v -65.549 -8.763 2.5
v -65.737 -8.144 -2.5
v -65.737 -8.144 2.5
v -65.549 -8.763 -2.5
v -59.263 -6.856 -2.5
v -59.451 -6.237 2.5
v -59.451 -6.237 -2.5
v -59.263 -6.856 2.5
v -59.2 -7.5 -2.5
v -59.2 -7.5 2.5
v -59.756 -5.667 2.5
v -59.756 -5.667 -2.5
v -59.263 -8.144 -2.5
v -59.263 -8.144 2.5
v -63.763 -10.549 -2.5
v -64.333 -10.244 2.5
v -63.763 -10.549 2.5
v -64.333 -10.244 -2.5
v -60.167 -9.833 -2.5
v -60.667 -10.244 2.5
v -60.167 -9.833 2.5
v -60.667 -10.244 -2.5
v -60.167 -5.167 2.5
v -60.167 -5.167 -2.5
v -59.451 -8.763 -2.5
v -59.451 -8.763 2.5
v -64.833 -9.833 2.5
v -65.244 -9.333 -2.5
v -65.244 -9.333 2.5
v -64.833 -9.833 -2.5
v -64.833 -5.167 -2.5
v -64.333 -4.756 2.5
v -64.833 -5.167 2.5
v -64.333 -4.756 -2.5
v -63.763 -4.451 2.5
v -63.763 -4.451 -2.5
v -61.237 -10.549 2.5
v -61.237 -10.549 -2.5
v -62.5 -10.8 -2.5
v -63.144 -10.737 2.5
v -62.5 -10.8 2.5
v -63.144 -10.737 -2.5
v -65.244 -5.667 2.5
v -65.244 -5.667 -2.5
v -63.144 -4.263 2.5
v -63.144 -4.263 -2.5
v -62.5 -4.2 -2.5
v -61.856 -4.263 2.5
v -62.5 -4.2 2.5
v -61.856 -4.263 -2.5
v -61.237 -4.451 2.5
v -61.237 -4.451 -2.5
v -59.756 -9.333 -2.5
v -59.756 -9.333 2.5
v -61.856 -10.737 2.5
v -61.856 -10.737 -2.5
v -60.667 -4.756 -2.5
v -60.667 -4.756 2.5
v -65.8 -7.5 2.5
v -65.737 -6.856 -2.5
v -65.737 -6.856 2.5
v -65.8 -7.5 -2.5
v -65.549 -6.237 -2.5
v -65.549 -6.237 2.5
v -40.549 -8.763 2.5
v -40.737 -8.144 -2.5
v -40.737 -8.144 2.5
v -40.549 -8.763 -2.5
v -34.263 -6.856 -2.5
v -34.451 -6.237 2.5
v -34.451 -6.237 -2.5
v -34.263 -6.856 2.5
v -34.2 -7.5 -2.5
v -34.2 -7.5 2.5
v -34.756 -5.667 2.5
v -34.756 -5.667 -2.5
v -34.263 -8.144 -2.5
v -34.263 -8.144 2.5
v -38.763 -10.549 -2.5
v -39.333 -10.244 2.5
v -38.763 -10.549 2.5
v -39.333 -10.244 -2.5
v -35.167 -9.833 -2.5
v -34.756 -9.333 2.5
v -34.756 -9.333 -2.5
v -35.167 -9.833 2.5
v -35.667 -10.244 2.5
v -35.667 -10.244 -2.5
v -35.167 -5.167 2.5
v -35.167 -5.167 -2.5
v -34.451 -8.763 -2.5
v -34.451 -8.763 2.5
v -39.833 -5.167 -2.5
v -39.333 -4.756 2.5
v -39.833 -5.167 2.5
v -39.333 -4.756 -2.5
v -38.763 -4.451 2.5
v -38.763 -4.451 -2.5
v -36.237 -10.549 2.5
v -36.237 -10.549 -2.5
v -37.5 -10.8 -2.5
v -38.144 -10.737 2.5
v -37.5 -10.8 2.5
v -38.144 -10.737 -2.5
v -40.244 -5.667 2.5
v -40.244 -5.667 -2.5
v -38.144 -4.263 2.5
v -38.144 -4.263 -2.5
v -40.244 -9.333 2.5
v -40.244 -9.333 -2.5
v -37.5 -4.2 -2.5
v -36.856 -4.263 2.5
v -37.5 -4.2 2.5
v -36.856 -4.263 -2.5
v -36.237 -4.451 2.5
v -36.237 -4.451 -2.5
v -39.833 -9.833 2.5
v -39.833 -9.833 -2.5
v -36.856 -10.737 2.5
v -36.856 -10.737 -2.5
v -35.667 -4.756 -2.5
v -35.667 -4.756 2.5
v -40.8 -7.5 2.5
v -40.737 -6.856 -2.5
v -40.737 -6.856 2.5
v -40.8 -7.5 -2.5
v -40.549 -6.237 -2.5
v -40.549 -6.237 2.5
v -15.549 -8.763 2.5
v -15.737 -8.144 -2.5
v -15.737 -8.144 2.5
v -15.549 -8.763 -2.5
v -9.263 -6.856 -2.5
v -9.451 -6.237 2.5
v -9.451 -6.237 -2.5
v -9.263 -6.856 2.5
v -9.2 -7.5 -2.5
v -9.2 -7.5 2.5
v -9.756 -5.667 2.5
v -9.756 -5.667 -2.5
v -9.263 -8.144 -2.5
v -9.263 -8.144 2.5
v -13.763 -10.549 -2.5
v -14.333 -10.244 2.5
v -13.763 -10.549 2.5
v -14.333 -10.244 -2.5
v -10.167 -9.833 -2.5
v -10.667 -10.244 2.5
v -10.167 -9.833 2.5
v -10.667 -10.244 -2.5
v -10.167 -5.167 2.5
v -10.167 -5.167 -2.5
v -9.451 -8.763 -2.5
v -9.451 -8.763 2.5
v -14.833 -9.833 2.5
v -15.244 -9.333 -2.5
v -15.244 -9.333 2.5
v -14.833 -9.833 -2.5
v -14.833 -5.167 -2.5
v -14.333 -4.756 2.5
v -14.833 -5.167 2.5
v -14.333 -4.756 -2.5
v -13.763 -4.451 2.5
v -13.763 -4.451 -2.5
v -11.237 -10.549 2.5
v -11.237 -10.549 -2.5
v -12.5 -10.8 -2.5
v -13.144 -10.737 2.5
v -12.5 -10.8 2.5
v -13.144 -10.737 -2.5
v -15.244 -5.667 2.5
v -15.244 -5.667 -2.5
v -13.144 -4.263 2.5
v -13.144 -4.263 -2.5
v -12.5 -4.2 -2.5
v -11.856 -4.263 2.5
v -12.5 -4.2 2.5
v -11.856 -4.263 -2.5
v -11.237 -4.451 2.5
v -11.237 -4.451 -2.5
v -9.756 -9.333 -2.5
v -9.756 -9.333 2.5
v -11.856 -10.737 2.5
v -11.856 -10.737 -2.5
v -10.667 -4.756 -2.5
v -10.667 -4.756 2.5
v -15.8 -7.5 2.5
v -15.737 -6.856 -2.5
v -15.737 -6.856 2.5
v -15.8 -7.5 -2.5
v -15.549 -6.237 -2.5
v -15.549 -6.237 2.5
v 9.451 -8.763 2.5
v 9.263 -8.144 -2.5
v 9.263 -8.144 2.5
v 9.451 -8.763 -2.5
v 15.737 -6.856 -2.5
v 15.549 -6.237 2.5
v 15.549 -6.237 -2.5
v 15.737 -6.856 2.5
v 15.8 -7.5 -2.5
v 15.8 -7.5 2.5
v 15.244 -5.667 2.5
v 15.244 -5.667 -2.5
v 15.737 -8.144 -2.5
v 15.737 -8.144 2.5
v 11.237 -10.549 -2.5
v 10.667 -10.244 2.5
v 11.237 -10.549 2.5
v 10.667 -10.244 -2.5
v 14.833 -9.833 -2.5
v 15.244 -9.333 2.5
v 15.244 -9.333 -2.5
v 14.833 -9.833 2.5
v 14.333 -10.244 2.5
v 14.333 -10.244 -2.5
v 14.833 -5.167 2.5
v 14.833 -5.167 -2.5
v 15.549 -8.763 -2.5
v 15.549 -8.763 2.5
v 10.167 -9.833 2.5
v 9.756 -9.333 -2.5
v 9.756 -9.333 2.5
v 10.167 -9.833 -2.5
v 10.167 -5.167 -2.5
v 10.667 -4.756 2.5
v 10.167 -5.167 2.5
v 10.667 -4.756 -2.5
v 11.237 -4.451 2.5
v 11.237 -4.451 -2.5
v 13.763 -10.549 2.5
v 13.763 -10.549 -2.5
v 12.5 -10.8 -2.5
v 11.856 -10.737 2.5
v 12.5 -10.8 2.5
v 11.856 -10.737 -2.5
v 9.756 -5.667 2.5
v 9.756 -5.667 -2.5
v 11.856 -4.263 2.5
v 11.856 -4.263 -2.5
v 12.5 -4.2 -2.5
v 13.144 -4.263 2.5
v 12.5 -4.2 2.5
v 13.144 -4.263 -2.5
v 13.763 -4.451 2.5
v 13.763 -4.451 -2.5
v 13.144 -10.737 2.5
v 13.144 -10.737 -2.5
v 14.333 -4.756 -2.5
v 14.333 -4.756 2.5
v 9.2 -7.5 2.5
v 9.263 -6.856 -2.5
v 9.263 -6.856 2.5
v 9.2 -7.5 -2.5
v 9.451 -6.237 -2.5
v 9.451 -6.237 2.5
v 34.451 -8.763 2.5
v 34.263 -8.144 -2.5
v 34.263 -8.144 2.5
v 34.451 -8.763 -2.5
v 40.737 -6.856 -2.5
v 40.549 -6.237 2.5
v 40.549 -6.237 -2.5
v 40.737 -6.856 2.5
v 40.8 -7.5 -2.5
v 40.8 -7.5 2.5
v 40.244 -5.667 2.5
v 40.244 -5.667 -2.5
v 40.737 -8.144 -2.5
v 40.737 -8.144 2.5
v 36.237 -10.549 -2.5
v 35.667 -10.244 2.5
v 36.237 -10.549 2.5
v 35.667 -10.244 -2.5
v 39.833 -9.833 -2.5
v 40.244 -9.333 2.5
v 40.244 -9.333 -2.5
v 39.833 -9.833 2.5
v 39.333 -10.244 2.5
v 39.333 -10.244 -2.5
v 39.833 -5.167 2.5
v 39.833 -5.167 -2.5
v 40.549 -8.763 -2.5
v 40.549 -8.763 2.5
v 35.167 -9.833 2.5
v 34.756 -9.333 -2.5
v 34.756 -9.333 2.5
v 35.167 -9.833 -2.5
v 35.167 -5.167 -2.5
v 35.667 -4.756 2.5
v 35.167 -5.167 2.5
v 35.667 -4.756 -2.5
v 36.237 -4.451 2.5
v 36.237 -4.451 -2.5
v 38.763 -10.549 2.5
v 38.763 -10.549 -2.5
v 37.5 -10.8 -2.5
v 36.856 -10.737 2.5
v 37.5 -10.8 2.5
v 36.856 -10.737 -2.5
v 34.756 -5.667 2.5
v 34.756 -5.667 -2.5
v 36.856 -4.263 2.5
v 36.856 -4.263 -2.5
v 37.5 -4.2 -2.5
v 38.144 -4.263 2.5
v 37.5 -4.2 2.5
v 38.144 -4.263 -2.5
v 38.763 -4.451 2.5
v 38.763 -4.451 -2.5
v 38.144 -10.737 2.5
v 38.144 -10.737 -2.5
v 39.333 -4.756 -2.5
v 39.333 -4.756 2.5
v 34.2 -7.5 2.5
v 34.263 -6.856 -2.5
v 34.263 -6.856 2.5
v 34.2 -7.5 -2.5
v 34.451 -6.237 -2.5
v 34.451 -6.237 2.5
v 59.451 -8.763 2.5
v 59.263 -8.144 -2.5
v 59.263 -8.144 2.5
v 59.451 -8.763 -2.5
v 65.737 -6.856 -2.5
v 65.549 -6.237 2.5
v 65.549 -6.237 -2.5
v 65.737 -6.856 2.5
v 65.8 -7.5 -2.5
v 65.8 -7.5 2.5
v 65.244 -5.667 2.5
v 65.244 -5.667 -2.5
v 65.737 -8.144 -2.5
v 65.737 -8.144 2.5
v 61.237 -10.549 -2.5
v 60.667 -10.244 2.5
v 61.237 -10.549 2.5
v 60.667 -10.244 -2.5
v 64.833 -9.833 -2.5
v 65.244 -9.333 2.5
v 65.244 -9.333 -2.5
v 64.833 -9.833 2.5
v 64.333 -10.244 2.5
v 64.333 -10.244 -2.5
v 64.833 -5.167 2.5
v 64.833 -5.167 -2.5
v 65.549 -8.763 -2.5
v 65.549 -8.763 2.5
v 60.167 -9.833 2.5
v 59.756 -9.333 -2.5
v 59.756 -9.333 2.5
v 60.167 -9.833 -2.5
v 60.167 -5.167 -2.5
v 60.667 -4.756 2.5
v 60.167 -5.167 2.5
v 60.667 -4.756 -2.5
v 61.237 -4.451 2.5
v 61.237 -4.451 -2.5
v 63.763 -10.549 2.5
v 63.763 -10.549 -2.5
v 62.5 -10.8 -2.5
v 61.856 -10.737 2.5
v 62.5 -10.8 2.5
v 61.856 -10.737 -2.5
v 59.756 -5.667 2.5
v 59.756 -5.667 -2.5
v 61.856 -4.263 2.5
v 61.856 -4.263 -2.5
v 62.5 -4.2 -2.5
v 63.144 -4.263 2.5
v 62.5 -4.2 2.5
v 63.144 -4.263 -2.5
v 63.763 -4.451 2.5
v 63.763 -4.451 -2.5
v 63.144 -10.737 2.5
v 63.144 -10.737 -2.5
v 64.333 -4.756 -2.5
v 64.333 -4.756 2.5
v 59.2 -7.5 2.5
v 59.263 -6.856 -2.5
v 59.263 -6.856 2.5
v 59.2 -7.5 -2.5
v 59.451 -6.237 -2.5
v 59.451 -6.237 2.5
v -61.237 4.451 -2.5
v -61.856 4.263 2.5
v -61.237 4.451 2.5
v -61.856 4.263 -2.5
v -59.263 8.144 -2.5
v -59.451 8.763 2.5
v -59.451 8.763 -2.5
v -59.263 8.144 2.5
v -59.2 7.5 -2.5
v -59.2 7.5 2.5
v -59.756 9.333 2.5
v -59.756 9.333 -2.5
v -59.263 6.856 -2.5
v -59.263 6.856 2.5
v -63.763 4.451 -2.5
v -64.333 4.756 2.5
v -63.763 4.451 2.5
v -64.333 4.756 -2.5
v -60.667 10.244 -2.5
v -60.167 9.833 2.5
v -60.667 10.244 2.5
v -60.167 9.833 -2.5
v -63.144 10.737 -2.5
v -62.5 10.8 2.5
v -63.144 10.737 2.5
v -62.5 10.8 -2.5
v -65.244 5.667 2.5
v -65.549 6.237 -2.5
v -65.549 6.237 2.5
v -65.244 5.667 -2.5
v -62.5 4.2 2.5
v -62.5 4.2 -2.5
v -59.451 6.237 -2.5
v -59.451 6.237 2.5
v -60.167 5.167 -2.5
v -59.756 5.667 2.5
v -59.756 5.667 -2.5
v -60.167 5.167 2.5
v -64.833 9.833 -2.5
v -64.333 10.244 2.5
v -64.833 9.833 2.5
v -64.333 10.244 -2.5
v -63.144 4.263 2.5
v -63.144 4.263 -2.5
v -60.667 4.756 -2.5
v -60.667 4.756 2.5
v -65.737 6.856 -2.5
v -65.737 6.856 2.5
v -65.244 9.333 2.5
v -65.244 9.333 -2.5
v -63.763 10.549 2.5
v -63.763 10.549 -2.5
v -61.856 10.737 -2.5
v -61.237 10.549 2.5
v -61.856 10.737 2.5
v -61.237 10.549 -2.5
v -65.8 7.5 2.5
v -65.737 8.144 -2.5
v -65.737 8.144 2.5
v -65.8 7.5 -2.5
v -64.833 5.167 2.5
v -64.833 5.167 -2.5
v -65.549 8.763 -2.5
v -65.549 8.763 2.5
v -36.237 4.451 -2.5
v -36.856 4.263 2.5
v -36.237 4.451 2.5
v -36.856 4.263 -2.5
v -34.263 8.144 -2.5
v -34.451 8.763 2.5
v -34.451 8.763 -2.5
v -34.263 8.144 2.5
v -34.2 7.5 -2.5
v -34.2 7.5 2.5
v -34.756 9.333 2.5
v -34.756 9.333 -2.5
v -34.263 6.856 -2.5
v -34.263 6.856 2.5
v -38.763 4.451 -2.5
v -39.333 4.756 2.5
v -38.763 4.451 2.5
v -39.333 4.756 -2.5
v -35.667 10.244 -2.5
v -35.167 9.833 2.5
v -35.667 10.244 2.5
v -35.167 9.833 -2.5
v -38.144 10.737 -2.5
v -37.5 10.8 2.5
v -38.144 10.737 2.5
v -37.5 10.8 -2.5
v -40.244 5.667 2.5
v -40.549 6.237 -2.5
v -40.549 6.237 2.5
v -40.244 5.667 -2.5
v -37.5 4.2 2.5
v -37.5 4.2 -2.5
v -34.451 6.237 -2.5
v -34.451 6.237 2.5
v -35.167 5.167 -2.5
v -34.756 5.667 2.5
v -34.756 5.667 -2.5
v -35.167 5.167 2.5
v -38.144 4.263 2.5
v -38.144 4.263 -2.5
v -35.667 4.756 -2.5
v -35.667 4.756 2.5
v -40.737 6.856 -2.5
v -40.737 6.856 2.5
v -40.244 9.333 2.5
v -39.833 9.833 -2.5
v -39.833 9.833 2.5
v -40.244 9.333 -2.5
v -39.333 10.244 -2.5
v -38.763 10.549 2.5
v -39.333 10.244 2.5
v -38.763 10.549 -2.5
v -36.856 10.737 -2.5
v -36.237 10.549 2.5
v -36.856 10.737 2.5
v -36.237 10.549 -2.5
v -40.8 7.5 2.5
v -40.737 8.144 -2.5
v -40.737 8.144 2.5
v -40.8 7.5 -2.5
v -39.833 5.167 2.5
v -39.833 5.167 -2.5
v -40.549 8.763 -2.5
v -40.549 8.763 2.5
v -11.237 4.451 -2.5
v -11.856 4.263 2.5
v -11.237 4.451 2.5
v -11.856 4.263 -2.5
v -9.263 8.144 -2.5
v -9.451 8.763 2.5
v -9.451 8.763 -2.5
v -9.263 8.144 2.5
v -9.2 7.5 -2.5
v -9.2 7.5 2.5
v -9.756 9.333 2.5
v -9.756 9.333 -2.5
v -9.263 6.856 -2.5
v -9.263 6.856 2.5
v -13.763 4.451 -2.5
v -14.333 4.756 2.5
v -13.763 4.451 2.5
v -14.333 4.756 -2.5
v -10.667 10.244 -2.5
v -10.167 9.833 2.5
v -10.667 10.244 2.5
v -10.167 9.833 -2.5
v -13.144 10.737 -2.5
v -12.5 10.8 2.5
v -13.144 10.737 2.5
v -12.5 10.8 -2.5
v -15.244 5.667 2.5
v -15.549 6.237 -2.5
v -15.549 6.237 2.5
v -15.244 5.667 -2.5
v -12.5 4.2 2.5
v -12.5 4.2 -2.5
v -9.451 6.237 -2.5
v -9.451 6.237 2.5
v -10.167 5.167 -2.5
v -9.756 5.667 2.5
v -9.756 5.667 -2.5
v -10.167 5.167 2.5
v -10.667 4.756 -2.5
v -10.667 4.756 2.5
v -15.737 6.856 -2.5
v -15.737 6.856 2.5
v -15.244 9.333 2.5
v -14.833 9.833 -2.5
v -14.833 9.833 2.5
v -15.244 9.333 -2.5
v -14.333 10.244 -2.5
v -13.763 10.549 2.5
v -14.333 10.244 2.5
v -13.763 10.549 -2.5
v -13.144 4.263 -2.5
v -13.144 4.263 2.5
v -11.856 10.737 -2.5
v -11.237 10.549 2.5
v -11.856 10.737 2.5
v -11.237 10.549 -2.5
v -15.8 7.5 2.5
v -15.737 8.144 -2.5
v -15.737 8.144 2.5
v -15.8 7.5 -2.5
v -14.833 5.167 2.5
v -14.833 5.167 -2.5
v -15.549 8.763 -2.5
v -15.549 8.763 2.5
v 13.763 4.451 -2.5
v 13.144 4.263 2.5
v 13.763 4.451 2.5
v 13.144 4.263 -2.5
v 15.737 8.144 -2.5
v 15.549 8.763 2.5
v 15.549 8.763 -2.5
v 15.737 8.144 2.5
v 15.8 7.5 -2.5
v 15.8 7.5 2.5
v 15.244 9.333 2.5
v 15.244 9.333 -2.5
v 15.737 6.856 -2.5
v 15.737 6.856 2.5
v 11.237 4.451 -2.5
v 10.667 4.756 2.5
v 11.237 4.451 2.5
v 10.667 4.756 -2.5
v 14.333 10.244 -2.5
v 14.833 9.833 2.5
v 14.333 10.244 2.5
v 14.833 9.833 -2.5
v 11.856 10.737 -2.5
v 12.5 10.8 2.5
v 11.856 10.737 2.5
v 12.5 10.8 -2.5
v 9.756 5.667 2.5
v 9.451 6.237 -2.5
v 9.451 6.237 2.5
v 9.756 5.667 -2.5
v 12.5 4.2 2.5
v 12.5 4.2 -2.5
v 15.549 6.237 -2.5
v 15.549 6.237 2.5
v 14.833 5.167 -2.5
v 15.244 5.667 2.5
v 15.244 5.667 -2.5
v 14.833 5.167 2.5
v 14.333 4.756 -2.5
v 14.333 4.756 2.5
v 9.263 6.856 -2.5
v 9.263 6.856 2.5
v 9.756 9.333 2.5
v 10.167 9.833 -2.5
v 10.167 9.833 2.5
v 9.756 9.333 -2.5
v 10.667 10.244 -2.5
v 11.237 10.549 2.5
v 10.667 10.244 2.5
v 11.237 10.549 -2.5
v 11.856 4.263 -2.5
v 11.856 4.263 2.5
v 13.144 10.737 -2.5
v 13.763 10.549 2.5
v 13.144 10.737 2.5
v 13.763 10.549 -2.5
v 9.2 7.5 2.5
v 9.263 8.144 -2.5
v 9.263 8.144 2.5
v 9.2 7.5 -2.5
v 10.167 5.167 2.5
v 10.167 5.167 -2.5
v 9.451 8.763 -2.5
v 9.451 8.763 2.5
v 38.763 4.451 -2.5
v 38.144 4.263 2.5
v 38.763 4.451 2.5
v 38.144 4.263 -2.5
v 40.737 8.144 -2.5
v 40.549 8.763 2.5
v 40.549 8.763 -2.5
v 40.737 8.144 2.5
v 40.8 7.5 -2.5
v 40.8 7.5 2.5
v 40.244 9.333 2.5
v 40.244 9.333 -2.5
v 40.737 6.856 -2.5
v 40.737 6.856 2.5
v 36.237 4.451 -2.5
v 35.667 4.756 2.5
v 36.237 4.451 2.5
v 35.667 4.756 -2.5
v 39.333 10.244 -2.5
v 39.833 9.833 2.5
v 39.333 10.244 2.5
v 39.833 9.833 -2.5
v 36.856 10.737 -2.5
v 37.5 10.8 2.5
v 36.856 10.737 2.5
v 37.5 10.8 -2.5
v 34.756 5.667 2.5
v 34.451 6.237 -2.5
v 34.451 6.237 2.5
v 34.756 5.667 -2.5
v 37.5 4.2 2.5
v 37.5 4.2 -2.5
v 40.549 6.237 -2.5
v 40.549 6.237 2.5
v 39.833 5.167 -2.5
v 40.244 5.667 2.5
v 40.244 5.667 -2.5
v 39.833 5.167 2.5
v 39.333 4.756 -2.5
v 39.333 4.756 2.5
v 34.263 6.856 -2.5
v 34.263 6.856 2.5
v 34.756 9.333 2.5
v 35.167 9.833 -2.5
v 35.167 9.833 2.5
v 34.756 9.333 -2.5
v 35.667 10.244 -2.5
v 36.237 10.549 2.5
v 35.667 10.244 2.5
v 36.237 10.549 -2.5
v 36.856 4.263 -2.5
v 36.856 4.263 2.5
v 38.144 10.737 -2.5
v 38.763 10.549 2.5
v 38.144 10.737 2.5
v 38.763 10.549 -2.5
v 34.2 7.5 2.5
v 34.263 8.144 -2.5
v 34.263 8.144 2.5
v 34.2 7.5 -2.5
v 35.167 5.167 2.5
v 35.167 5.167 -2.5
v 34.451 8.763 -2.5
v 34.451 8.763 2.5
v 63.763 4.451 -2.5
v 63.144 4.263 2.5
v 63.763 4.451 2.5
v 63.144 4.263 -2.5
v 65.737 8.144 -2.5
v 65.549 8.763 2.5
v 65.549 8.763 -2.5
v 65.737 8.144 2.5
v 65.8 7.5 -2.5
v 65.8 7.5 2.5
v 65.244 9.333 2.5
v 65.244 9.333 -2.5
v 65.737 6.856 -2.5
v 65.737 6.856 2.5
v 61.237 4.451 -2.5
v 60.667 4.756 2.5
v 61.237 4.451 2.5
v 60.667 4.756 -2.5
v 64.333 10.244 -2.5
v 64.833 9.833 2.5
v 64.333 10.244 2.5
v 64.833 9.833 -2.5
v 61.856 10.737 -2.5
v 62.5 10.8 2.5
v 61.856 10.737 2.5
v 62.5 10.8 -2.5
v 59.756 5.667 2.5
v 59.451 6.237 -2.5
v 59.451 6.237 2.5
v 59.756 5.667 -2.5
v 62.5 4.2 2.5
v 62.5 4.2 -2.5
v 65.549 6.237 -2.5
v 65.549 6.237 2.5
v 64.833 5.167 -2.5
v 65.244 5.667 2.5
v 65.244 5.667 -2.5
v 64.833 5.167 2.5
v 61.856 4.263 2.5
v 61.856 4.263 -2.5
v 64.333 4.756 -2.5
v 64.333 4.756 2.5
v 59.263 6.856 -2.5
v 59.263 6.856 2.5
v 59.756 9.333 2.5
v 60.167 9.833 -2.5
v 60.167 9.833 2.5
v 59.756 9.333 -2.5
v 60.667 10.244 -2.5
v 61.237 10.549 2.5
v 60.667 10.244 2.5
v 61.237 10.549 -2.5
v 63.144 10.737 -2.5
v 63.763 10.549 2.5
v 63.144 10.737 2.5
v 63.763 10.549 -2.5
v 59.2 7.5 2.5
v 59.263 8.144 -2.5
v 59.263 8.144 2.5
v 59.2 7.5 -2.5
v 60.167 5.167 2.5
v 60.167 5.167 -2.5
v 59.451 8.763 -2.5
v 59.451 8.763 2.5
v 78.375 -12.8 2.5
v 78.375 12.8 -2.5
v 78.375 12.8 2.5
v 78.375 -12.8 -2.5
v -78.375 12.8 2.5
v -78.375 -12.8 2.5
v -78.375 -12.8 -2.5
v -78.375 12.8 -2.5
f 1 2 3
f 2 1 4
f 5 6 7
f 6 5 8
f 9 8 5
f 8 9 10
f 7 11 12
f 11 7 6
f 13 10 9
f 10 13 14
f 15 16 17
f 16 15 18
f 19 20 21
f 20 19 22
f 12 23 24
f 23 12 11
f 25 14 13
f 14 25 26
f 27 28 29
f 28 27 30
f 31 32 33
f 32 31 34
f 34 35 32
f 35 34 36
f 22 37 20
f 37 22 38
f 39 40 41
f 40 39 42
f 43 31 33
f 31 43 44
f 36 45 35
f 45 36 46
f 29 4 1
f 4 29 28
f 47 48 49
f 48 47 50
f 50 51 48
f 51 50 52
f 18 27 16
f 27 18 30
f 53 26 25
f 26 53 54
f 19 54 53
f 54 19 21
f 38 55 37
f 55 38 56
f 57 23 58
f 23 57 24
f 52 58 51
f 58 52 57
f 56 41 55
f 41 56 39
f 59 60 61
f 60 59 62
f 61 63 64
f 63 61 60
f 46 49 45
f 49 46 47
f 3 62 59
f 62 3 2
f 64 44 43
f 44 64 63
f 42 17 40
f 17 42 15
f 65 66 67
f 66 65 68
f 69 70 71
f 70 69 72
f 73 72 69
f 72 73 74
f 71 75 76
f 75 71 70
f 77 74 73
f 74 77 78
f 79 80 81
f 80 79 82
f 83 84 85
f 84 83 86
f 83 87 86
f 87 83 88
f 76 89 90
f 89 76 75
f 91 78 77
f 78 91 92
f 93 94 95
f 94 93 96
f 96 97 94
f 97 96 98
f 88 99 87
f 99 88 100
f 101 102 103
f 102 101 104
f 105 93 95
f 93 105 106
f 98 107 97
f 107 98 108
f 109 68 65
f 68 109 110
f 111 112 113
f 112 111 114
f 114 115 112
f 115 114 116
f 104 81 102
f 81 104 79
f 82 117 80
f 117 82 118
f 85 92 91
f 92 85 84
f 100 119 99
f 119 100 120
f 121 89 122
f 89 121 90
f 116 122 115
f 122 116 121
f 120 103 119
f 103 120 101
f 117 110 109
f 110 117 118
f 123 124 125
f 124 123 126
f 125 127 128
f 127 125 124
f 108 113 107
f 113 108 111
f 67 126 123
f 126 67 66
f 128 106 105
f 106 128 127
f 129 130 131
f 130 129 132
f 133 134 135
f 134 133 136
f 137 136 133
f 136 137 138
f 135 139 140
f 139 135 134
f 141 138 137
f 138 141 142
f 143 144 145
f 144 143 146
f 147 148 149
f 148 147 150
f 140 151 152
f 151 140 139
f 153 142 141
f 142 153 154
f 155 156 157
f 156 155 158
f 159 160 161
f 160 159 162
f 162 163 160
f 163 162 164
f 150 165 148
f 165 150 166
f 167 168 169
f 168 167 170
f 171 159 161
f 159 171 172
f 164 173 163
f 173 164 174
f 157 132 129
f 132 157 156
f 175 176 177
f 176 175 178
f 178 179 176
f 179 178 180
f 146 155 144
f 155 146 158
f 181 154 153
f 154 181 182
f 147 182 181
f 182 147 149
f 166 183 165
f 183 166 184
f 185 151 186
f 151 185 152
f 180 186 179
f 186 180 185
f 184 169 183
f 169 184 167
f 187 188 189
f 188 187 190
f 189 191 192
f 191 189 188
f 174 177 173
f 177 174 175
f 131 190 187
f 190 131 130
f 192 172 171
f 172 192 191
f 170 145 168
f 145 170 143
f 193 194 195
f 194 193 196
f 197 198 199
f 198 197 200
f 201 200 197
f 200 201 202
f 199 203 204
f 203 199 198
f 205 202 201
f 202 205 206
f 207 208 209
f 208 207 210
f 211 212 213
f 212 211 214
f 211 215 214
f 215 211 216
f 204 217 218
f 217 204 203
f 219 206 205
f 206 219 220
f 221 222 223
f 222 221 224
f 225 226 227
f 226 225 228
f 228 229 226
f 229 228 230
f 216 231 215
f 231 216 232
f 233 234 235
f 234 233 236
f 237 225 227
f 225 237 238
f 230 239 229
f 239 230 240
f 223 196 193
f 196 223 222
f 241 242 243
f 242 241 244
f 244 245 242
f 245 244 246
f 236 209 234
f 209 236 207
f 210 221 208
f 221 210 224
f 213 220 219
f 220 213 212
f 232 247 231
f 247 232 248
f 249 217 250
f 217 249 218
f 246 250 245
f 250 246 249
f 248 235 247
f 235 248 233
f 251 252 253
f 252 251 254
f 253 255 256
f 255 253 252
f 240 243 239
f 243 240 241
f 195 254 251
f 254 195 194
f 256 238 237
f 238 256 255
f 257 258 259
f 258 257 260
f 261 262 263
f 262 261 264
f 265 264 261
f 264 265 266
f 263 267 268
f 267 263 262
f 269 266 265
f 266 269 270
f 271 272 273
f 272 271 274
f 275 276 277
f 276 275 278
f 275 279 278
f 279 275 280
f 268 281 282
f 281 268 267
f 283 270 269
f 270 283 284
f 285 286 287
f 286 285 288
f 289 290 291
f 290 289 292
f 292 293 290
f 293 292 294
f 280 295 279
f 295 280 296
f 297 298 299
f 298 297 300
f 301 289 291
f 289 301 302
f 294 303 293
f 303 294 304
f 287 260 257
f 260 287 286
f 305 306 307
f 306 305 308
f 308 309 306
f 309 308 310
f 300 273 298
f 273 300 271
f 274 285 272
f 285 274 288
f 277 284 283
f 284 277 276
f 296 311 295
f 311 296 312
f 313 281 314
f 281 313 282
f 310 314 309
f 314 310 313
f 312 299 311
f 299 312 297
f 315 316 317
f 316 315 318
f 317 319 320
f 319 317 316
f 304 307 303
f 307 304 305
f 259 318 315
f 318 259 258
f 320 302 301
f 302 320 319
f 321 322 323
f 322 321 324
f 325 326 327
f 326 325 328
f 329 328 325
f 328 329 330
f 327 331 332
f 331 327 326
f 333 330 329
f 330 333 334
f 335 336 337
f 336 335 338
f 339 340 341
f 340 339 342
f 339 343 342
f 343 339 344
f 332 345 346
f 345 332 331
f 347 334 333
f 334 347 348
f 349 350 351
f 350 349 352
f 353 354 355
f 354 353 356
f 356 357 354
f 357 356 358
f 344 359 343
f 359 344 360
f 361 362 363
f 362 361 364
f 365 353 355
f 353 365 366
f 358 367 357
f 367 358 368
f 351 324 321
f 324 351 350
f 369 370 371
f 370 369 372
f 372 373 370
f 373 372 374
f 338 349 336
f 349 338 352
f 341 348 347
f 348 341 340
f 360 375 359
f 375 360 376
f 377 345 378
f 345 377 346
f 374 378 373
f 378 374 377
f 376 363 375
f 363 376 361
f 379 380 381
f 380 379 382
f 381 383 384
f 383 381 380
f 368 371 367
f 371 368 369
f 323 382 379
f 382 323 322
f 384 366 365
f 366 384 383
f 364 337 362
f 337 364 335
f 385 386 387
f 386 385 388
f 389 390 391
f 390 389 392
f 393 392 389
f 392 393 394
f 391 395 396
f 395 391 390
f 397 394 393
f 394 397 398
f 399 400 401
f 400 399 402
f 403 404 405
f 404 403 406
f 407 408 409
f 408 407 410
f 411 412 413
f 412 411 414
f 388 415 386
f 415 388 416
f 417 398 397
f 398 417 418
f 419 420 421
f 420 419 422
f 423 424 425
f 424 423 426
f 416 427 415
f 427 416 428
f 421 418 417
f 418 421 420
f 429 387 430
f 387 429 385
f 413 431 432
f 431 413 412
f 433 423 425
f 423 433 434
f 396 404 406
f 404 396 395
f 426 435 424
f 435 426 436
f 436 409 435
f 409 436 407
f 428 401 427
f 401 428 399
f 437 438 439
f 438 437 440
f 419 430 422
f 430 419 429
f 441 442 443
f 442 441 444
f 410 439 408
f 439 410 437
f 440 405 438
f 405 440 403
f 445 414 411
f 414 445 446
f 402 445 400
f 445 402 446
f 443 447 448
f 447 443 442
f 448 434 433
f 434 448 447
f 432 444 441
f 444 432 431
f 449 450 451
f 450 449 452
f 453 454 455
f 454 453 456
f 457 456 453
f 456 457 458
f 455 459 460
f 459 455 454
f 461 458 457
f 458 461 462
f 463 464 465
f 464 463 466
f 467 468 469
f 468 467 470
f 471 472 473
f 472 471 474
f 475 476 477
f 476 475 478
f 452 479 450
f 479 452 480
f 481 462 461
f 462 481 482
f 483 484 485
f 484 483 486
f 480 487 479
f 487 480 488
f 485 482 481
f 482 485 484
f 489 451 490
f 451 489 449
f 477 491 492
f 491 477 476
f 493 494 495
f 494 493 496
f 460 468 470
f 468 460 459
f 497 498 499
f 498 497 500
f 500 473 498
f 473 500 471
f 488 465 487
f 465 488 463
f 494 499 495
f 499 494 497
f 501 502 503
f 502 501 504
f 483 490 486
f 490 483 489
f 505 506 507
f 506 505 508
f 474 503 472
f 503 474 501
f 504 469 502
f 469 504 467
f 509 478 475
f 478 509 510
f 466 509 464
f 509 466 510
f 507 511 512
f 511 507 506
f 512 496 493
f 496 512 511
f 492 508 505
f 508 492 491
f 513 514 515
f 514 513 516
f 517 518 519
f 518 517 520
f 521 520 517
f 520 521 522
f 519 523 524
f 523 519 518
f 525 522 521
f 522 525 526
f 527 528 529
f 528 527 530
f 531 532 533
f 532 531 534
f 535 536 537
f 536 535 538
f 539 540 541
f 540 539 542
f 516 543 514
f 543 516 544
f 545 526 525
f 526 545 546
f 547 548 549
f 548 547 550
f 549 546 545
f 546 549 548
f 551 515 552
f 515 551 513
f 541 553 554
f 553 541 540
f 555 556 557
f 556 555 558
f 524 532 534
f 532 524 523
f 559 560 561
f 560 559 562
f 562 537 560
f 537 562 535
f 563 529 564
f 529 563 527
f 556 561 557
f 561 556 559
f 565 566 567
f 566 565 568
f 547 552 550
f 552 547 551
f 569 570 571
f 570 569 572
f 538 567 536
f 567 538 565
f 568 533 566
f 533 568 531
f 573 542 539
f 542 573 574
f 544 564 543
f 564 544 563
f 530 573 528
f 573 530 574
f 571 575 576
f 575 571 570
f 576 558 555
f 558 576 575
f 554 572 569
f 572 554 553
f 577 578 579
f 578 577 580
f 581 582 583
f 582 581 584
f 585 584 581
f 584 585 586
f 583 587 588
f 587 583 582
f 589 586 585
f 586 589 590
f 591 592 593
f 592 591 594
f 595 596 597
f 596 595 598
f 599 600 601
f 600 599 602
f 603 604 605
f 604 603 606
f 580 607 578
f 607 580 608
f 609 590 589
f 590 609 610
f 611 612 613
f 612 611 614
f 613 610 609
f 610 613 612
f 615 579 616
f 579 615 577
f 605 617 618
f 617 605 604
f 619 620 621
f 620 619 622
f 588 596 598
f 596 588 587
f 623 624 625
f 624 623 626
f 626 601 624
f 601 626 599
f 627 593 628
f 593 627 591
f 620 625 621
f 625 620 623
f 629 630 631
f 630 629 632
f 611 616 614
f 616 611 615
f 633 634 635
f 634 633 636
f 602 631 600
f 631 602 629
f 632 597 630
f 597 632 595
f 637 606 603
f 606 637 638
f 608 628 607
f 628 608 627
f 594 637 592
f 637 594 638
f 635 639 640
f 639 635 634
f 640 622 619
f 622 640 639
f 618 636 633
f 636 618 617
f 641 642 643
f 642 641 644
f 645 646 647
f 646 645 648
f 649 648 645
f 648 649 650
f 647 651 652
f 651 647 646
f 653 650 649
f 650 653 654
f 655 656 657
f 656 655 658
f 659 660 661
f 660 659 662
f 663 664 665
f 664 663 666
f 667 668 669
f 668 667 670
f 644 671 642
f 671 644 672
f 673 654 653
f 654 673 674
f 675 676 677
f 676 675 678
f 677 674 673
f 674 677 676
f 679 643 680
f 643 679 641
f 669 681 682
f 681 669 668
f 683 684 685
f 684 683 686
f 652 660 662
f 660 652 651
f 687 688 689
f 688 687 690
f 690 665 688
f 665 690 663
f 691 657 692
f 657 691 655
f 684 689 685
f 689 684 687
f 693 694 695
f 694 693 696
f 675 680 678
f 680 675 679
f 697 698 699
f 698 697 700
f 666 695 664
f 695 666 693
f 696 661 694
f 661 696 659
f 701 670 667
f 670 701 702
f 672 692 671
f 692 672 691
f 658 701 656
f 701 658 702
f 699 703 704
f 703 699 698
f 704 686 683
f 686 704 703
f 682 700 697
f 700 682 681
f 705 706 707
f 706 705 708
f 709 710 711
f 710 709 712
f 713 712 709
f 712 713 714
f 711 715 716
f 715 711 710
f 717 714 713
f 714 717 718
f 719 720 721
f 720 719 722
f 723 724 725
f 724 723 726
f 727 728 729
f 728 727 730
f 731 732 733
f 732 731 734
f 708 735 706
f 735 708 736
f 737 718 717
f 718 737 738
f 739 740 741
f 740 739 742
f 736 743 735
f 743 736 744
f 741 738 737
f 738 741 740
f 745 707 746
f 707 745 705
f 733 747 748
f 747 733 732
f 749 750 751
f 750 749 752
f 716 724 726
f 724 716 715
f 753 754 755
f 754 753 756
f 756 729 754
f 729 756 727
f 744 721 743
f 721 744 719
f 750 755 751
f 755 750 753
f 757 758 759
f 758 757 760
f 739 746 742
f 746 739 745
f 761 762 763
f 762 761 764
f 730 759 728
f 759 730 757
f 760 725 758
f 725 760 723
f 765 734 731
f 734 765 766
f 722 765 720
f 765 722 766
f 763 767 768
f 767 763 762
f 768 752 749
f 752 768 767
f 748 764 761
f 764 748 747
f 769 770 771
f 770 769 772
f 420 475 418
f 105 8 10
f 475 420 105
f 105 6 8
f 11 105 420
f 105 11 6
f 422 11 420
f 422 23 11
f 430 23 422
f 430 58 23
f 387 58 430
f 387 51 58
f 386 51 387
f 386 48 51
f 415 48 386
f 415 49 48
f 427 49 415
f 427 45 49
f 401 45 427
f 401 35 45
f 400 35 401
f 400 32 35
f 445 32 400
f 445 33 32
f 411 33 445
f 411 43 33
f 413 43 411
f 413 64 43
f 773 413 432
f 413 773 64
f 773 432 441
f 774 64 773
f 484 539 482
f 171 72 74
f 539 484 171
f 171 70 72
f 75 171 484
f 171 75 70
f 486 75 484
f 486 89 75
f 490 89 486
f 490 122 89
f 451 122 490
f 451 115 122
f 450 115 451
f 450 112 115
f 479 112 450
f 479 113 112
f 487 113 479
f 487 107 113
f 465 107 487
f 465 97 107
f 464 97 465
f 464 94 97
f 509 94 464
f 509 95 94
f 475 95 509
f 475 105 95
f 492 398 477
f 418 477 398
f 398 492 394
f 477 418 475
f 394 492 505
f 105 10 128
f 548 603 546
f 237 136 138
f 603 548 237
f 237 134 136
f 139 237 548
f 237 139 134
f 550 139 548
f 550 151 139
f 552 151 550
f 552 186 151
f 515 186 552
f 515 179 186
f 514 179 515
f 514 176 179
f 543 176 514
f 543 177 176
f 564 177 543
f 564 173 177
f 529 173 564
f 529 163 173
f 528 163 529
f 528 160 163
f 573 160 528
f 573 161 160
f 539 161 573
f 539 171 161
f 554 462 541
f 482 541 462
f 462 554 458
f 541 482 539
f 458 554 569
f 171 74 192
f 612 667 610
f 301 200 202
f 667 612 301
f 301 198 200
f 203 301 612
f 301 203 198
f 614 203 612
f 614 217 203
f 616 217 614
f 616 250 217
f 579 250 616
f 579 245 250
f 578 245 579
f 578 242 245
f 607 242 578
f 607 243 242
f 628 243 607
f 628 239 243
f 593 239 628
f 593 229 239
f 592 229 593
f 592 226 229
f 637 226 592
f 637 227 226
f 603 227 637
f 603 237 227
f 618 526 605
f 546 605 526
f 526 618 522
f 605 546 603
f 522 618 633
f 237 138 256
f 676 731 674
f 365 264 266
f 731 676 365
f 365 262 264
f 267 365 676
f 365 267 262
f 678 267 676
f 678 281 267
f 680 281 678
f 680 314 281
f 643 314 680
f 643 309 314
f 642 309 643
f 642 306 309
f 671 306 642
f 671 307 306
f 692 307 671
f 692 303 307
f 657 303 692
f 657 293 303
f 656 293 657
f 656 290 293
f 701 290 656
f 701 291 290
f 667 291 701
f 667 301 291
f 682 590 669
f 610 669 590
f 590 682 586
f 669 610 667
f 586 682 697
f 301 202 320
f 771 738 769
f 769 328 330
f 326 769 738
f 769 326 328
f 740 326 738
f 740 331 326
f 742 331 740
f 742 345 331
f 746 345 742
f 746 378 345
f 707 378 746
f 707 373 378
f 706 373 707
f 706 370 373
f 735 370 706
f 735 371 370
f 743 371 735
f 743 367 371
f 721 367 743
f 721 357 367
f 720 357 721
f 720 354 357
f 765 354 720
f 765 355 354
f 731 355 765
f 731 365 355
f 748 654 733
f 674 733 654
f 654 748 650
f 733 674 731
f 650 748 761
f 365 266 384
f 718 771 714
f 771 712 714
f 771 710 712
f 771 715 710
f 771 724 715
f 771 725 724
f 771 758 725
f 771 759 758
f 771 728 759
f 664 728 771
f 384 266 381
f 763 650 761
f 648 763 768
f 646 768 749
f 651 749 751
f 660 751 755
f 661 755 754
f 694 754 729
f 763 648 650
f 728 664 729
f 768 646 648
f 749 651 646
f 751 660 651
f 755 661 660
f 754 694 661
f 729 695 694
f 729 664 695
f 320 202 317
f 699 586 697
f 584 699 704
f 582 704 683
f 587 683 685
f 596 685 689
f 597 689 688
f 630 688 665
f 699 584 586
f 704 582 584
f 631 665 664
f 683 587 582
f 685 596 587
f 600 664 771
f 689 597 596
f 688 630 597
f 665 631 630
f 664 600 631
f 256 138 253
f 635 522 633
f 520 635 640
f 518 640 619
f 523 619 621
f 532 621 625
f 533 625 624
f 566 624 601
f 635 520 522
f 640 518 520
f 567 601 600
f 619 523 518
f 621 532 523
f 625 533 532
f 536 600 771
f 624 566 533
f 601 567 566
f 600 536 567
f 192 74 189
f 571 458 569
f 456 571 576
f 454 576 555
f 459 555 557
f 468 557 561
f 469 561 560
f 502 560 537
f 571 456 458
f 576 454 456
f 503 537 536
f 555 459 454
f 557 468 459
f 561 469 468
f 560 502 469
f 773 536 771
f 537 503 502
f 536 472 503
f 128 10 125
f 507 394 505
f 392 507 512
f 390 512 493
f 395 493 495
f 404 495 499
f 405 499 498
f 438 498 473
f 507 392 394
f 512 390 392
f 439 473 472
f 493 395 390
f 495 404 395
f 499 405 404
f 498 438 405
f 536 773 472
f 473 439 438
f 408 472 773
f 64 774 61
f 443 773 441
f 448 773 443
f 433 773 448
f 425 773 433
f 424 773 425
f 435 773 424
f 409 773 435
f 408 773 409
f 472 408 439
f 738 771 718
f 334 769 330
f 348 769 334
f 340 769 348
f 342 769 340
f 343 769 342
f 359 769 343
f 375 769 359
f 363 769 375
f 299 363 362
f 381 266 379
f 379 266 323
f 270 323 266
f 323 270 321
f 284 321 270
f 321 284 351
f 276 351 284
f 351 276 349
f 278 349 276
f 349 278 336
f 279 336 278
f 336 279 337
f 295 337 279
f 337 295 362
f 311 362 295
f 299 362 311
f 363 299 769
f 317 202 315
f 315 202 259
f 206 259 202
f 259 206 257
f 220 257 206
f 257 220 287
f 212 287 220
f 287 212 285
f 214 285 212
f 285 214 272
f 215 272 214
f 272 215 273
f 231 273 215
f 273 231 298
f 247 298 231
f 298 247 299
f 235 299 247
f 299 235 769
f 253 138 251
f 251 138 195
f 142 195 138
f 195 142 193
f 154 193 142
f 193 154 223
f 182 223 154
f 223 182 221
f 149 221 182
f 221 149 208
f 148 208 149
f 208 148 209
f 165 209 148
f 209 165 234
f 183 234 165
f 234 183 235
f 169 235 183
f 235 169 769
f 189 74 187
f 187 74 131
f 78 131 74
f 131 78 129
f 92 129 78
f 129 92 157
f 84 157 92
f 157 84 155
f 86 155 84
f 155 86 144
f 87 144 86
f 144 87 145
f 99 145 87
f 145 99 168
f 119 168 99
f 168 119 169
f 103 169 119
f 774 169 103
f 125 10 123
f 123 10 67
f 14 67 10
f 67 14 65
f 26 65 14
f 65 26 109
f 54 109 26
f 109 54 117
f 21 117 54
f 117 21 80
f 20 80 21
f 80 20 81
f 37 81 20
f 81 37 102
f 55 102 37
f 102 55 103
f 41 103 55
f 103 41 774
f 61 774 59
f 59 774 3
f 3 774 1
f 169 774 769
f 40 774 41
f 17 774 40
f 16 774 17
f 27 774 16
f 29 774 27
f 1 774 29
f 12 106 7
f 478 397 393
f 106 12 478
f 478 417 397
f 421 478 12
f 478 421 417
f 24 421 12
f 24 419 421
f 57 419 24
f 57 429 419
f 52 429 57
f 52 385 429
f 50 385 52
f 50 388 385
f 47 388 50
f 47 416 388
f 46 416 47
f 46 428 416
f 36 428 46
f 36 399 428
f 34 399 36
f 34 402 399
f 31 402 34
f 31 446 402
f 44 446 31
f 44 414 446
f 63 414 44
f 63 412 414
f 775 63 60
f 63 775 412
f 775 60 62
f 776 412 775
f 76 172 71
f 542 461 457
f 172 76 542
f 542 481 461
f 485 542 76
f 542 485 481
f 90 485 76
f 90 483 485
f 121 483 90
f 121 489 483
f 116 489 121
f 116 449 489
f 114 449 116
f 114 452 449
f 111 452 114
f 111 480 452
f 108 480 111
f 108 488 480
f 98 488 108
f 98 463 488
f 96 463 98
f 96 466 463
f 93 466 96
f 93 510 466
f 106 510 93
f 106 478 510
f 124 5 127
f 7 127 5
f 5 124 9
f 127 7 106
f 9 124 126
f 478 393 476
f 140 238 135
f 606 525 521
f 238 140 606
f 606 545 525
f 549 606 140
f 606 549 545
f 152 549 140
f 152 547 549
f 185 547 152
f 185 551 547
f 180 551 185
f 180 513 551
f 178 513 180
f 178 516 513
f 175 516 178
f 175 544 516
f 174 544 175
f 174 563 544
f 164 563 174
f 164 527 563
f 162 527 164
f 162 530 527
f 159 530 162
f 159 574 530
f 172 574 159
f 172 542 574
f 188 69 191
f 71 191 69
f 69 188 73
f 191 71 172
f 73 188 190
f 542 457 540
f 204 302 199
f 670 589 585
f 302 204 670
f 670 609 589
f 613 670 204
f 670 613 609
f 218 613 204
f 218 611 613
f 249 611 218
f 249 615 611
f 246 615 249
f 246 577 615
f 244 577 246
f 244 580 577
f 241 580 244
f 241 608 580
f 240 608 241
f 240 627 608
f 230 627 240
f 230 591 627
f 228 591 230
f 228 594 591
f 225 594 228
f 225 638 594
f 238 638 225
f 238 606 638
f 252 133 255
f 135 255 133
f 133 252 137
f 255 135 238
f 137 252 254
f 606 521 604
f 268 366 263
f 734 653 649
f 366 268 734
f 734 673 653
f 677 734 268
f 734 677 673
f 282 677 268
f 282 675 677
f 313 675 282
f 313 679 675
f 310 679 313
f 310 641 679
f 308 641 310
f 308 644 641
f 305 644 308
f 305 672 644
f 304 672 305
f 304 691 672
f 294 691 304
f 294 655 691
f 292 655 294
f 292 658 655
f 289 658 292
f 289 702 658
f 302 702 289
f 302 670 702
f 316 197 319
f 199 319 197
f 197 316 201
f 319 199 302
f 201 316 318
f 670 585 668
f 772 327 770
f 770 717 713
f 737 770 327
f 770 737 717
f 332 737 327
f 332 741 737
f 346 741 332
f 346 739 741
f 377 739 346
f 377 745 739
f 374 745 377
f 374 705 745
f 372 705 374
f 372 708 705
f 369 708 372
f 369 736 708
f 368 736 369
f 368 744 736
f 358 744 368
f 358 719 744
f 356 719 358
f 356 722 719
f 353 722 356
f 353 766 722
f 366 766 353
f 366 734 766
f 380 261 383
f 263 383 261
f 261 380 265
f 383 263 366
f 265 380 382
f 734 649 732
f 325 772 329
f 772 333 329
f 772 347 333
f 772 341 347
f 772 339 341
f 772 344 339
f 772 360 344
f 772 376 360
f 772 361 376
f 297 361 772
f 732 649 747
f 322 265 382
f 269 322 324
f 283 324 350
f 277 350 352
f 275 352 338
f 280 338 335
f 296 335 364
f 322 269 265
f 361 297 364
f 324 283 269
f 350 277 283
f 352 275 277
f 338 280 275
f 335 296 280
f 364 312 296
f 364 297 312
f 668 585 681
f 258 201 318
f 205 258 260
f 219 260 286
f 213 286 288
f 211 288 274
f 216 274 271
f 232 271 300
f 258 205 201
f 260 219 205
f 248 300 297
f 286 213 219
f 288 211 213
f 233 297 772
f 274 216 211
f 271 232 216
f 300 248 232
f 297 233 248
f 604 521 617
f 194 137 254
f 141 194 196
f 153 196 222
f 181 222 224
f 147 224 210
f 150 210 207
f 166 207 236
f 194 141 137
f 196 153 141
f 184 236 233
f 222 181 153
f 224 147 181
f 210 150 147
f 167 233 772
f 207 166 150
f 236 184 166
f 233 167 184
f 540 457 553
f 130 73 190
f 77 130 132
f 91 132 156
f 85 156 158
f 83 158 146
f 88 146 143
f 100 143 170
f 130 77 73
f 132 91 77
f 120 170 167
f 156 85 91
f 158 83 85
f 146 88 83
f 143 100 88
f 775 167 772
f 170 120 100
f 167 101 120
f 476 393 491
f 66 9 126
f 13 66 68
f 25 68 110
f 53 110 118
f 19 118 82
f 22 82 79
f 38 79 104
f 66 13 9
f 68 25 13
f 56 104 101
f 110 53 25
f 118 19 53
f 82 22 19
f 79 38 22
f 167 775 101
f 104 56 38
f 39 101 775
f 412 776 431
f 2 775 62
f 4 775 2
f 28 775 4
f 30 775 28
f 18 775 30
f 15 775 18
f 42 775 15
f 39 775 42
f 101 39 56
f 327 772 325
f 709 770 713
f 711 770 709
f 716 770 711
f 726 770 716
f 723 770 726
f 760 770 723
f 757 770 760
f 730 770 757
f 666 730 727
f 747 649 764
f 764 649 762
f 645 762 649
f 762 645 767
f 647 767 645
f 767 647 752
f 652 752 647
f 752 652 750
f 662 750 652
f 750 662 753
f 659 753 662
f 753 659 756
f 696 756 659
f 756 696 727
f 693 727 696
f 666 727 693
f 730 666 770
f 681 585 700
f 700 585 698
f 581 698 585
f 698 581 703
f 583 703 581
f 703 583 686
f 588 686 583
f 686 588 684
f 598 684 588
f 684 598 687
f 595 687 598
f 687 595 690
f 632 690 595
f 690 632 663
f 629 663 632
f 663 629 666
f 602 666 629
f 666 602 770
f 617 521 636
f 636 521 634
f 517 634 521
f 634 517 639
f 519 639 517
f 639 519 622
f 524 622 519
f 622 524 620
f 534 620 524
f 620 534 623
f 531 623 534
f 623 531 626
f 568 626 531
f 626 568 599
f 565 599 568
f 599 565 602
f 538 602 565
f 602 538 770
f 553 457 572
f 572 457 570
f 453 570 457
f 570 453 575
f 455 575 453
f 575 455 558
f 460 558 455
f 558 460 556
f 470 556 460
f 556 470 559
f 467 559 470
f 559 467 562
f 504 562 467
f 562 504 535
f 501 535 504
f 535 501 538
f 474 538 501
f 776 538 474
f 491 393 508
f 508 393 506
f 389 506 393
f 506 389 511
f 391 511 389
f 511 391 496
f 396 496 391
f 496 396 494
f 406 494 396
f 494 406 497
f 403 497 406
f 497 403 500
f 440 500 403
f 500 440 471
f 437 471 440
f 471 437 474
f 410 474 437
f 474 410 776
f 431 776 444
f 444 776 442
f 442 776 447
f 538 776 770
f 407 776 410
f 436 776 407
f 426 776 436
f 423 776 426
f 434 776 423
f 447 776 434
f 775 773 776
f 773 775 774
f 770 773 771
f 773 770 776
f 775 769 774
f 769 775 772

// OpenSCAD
$fn = 32;

// ----------------------------------------------------------------------
// Hole bar, 6 x Ø6.6
// tworows layout, 15.875 mm edge offset
// ----------------------------------------------------------------------

// --- parameters (mm) ---
bar_w = 25.6;     // bar width (Y)
seat_tol = 0.15;  // tolerance at the seating features
free_tol = 0.5;   // general tolerance on the free sizes
bar_t = 5;        // bar thickness (Z)
holes = 6;        // holes per row
hole_d = 6.6;     // hole diameter
edge = 15.875;    // offset from the bar end to the first hole
pitch = 25;       // pitch between neighbouring holes
row_offset = 15;  // distance between the two rows

// --- derived feature positions (mm) ---
span = (holes - 1) * pitch;   // = 125   distance between the end holes
bar_l = span + 2 * edge;      // = 156.75   overall bar length
start_x = -bar_l / 2 + edge;  // = -62.5   X of the first hole
feature_centers = [
  [start_x + 0 * pitch, -row_offset / 2],
  [start_x + 1 * pitch, -row_offset / 2],
  [start_x + 2 * pitch, -row_offset / 2],
  [start_x + 3 * pitch, -row_offset / 2],
  [start_x + 4 * pitch, -row_offset / 2],
  [start_x + 5 * pitch, -row_offset / 2]
];   // hole centres of the first row
row2_centers = [
  [start_x + 0 * pitch, row_offset / 2],
  [start_x + 1 * pitch, row_offset / 2],
  [start_x + 2 * pitch, row_offset / 2],
  [start_x + 3 * pitch, row_offset / 2],
  [start_x + 4 * pitch, row_offset / 2],
  [start_x + 5 * pitch, row_offset / 2]
];   // hole centres of the second row

// bar with two rows of holes, both read from their own centre arrays
difference() {
  translate([-bar_l / 2, -bar_w / 2, -bar_t / 2]) cube([bar_l, bar_w, bar_t]);
  for (centre = feature_centers)
    translate([centre[0], centre[1], 0])
      cylinder(d = hole_d, h = bar_t + 2, center = true);
  for (centre = row2_centers)
    translate([centre[0], centre[1], 0])
      cylinder(d = hole_d, h = bar_t + 2, center = true);
}
